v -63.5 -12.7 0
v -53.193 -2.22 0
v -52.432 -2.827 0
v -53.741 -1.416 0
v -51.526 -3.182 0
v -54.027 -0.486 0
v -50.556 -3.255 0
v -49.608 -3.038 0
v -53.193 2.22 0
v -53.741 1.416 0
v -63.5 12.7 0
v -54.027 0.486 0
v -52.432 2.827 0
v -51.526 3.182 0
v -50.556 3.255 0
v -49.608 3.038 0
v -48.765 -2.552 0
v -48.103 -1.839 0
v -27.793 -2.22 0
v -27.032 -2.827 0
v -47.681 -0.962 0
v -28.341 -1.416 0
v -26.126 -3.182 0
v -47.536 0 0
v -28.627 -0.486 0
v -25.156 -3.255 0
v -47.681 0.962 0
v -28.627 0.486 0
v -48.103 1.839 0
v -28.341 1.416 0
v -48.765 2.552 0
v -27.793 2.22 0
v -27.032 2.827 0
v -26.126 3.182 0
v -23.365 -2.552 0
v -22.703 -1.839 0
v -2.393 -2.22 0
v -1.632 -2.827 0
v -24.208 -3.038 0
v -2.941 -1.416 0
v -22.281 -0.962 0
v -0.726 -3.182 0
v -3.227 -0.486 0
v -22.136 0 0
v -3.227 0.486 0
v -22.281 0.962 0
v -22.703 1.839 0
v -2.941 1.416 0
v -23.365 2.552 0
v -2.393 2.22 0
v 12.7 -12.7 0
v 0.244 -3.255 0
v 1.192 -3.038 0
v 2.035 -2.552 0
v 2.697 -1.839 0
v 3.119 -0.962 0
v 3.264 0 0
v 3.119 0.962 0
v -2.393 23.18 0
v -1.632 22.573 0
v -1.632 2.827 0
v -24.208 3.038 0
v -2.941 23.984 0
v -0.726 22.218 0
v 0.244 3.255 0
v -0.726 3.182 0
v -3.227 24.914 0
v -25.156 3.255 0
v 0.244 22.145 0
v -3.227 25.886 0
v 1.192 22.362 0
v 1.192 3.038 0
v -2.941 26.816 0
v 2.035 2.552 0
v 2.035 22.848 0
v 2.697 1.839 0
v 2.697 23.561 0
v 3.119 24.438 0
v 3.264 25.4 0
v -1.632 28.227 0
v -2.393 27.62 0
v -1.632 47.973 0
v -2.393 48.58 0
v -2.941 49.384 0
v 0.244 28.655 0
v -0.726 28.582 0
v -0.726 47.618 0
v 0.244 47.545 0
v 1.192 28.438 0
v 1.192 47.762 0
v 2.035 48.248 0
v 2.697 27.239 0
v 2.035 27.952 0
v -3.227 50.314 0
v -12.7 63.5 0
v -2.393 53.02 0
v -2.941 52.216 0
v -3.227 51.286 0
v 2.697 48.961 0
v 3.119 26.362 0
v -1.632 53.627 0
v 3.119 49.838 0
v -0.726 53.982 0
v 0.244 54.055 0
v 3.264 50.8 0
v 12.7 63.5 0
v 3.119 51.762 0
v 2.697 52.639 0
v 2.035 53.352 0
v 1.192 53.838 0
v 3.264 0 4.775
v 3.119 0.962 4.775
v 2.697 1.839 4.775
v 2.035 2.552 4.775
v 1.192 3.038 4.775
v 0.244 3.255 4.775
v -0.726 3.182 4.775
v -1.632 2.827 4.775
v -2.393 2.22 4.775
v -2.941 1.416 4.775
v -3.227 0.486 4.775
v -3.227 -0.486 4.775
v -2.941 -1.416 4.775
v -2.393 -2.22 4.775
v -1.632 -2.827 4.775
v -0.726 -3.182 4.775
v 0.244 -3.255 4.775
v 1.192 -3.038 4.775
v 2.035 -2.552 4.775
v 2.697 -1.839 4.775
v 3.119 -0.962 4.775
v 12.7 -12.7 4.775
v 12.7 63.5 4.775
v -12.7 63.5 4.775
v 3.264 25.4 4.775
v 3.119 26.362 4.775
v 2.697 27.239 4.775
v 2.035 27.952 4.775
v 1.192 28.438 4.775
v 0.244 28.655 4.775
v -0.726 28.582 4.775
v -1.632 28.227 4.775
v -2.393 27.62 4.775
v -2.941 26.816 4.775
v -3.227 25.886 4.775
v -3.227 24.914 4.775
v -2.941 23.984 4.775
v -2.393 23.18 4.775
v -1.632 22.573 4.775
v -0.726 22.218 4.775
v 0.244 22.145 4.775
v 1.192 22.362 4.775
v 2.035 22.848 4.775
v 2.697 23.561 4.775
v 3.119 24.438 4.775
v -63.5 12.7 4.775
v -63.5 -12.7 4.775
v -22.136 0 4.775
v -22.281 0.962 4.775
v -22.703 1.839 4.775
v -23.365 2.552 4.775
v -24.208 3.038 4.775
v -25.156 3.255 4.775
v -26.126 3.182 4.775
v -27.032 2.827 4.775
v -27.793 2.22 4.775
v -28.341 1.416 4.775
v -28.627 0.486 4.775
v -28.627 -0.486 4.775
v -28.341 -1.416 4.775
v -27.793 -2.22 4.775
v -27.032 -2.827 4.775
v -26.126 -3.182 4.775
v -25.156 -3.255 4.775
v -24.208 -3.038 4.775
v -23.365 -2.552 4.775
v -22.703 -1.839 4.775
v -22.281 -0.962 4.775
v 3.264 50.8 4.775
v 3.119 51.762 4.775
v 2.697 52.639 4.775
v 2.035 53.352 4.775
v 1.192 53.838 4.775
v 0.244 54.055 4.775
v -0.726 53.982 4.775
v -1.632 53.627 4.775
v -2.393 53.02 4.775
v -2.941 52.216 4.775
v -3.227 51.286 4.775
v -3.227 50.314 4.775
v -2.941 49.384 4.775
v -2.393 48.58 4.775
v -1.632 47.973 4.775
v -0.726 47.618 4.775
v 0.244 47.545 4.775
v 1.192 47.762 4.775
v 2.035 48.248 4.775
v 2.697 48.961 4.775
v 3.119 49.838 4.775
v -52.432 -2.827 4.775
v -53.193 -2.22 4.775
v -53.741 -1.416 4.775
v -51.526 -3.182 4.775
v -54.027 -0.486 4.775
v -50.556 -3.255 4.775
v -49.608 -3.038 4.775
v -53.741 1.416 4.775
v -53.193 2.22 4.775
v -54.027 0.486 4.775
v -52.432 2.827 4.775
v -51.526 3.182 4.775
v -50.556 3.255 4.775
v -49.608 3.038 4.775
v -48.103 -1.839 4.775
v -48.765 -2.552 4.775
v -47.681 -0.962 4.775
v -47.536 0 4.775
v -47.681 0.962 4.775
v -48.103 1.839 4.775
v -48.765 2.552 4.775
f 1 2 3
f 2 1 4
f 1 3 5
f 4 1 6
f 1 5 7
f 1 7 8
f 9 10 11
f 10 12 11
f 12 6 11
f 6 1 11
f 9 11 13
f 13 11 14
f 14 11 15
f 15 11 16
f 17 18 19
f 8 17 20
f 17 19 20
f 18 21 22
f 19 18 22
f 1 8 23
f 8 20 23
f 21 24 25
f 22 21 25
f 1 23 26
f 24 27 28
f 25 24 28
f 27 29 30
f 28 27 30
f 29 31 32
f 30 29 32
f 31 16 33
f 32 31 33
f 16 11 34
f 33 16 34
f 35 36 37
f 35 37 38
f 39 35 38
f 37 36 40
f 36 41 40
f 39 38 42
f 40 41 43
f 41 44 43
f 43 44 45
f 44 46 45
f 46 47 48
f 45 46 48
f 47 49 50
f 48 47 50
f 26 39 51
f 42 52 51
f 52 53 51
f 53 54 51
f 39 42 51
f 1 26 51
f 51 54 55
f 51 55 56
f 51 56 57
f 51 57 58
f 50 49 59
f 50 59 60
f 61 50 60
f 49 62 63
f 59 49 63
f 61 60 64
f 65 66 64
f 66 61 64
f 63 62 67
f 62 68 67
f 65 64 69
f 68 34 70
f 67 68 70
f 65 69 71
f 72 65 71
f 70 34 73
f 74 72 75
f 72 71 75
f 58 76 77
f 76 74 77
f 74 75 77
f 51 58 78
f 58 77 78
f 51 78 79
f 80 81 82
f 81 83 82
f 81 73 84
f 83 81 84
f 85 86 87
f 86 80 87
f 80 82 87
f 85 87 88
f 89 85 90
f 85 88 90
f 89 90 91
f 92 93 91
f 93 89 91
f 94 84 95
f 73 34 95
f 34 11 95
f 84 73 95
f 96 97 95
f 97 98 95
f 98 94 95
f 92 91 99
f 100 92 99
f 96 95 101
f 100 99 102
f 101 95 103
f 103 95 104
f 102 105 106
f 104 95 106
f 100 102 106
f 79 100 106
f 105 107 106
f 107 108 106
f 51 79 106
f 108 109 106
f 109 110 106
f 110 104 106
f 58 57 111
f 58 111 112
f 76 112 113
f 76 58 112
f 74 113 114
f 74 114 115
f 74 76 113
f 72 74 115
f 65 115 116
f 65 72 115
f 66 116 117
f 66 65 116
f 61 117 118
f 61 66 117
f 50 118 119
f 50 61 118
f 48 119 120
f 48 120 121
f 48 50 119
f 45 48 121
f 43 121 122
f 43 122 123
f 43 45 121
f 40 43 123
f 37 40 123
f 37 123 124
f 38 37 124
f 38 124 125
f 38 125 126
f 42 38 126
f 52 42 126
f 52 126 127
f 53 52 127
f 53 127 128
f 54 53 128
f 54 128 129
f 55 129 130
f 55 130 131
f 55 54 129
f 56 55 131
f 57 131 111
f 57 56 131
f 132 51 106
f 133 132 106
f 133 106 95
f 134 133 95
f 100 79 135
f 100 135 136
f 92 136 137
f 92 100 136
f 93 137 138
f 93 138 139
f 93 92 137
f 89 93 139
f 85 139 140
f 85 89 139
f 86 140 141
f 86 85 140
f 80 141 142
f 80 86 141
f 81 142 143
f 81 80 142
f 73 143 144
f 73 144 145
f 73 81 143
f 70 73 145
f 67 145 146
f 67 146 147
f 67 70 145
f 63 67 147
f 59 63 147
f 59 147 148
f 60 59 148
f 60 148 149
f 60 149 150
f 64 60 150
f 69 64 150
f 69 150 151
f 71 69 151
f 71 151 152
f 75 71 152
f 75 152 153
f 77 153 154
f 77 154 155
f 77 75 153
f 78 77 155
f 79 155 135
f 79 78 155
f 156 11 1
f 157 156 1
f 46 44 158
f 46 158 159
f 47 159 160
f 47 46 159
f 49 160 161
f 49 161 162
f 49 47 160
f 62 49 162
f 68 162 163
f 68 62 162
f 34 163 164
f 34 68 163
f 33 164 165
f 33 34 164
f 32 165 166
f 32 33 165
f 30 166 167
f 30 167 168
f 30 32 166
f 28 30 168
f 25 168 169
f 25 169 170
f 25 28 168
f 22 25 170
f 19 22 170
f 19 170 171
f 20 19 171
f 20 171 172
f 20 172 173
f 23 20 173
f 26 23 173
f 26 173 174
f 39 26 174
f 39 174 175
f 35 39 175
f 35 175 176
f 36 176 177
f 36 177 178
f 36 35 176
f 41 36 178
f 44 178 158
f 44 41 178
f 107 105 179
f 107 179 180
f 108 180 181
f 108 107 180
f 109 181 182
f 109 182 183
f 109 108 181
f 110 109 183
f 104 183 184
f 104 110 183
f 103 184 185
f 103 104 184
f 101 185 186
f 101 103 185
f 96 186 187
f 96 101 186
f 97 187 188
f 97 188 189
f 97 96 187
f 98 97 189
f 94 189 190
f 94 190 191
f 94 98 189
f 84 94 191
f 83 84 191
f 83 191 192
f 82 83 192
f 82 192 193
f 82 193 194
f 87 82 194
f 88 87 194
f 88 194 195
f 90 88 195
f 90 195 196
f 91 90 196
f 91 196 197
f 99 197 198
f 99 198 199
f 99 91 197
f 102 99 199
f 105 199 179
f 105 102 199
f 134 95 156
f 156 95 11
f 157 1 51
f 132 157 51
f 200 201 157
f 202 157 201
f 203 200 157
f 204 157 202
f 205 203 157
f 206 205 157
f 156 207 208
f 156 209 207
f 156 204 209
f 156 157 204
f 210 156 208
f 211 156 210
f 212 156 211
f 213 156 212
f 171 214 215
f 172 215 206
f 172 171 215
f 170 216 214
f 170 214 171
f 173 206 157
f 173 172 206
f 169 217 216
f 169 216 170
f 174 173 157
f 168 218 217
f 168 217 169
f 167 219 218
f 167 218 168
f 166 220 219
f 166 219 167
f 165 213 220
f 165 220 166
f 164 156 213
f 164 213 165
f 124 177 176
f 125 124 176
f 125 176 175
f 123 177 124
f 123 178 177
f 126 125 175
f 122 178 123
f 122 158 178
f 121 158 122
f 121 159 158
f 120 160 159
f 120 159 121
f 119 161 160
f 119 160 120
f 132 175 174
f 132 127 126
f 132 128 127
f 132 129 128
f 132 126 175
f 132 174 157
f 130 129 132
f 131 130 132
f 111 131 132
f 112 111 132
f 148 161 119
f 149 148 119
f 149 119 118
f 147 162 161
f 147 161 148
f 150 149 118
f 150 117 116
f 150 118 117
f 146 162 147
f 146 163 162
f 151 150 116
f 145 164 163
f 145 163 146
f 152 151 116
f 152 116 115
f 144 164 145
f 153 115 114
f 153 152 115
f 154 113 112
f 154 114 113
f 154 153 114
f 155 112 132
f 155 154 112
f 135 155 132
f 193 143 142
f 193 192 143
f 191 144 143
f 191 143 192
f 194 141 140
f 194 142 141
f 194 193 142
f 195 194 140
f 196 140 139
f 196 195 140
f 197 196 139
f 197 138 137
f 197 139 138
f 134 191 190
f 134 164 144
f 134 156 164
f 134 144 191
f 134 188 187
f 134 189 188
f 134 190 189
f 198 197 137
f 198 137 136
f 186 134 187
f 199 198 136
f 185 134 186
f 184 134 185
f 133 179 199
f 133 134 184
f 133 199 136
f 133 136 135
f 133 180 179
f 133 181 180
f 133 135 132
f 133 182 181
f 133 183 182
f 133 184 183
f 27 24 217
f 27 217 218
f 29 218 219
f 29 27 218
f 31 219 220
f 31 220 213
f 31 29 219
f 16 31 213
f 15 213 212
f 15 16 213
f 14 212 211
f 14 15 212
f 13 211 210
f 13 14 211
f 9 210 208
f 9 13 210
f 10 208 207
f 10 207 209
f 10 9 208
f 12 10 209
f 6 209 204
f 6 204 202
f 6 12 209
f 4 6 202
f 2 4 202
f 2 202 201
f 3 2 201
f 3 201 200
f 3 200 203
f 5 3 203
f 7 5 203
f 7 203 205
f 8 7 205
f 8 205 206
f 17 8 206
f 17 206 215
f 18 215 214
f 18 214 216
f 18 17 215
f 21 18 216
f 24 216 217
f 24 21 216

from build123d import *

# Parameters (mm, degrees)
SKETCH1_R           = 3.2639
BOSS_EXTRUDE1_DEPTH = 4.7752


with BuildPart() as part:
    # Sketch1 → Boss-Extrude1 (new body)
    with BuildSketch(Plane.XY):
        Polygon((-63.5, -12.7), (12.7, -12.7), (12.7, 63.5), (-12.7, 63.5), (-63.5, 12.7), align=None)
        with Locations((0, 50.8)):
            Circle(SKETCH1_R, mode=Mode.SUBTRACT)
        with Locations((0, 25.4)):
            Circle(SKETCH1_R, mode=Mode.SUBTRACT)
        Circle(SKETCH1_R, mode=Mode.SUBTRACT)
        with Locations((-25.4, 0)):
            Circle(SKETCH1_R, mode=Mode.SUBTRACT)
        with Locations((-50.8, 0)):
            Circle(SKETCH1_R, mode=Mode.SUBTRACT)
    extrude(amount=BOSS_EXTRUDE1_DEPTH)


solid = part.part
